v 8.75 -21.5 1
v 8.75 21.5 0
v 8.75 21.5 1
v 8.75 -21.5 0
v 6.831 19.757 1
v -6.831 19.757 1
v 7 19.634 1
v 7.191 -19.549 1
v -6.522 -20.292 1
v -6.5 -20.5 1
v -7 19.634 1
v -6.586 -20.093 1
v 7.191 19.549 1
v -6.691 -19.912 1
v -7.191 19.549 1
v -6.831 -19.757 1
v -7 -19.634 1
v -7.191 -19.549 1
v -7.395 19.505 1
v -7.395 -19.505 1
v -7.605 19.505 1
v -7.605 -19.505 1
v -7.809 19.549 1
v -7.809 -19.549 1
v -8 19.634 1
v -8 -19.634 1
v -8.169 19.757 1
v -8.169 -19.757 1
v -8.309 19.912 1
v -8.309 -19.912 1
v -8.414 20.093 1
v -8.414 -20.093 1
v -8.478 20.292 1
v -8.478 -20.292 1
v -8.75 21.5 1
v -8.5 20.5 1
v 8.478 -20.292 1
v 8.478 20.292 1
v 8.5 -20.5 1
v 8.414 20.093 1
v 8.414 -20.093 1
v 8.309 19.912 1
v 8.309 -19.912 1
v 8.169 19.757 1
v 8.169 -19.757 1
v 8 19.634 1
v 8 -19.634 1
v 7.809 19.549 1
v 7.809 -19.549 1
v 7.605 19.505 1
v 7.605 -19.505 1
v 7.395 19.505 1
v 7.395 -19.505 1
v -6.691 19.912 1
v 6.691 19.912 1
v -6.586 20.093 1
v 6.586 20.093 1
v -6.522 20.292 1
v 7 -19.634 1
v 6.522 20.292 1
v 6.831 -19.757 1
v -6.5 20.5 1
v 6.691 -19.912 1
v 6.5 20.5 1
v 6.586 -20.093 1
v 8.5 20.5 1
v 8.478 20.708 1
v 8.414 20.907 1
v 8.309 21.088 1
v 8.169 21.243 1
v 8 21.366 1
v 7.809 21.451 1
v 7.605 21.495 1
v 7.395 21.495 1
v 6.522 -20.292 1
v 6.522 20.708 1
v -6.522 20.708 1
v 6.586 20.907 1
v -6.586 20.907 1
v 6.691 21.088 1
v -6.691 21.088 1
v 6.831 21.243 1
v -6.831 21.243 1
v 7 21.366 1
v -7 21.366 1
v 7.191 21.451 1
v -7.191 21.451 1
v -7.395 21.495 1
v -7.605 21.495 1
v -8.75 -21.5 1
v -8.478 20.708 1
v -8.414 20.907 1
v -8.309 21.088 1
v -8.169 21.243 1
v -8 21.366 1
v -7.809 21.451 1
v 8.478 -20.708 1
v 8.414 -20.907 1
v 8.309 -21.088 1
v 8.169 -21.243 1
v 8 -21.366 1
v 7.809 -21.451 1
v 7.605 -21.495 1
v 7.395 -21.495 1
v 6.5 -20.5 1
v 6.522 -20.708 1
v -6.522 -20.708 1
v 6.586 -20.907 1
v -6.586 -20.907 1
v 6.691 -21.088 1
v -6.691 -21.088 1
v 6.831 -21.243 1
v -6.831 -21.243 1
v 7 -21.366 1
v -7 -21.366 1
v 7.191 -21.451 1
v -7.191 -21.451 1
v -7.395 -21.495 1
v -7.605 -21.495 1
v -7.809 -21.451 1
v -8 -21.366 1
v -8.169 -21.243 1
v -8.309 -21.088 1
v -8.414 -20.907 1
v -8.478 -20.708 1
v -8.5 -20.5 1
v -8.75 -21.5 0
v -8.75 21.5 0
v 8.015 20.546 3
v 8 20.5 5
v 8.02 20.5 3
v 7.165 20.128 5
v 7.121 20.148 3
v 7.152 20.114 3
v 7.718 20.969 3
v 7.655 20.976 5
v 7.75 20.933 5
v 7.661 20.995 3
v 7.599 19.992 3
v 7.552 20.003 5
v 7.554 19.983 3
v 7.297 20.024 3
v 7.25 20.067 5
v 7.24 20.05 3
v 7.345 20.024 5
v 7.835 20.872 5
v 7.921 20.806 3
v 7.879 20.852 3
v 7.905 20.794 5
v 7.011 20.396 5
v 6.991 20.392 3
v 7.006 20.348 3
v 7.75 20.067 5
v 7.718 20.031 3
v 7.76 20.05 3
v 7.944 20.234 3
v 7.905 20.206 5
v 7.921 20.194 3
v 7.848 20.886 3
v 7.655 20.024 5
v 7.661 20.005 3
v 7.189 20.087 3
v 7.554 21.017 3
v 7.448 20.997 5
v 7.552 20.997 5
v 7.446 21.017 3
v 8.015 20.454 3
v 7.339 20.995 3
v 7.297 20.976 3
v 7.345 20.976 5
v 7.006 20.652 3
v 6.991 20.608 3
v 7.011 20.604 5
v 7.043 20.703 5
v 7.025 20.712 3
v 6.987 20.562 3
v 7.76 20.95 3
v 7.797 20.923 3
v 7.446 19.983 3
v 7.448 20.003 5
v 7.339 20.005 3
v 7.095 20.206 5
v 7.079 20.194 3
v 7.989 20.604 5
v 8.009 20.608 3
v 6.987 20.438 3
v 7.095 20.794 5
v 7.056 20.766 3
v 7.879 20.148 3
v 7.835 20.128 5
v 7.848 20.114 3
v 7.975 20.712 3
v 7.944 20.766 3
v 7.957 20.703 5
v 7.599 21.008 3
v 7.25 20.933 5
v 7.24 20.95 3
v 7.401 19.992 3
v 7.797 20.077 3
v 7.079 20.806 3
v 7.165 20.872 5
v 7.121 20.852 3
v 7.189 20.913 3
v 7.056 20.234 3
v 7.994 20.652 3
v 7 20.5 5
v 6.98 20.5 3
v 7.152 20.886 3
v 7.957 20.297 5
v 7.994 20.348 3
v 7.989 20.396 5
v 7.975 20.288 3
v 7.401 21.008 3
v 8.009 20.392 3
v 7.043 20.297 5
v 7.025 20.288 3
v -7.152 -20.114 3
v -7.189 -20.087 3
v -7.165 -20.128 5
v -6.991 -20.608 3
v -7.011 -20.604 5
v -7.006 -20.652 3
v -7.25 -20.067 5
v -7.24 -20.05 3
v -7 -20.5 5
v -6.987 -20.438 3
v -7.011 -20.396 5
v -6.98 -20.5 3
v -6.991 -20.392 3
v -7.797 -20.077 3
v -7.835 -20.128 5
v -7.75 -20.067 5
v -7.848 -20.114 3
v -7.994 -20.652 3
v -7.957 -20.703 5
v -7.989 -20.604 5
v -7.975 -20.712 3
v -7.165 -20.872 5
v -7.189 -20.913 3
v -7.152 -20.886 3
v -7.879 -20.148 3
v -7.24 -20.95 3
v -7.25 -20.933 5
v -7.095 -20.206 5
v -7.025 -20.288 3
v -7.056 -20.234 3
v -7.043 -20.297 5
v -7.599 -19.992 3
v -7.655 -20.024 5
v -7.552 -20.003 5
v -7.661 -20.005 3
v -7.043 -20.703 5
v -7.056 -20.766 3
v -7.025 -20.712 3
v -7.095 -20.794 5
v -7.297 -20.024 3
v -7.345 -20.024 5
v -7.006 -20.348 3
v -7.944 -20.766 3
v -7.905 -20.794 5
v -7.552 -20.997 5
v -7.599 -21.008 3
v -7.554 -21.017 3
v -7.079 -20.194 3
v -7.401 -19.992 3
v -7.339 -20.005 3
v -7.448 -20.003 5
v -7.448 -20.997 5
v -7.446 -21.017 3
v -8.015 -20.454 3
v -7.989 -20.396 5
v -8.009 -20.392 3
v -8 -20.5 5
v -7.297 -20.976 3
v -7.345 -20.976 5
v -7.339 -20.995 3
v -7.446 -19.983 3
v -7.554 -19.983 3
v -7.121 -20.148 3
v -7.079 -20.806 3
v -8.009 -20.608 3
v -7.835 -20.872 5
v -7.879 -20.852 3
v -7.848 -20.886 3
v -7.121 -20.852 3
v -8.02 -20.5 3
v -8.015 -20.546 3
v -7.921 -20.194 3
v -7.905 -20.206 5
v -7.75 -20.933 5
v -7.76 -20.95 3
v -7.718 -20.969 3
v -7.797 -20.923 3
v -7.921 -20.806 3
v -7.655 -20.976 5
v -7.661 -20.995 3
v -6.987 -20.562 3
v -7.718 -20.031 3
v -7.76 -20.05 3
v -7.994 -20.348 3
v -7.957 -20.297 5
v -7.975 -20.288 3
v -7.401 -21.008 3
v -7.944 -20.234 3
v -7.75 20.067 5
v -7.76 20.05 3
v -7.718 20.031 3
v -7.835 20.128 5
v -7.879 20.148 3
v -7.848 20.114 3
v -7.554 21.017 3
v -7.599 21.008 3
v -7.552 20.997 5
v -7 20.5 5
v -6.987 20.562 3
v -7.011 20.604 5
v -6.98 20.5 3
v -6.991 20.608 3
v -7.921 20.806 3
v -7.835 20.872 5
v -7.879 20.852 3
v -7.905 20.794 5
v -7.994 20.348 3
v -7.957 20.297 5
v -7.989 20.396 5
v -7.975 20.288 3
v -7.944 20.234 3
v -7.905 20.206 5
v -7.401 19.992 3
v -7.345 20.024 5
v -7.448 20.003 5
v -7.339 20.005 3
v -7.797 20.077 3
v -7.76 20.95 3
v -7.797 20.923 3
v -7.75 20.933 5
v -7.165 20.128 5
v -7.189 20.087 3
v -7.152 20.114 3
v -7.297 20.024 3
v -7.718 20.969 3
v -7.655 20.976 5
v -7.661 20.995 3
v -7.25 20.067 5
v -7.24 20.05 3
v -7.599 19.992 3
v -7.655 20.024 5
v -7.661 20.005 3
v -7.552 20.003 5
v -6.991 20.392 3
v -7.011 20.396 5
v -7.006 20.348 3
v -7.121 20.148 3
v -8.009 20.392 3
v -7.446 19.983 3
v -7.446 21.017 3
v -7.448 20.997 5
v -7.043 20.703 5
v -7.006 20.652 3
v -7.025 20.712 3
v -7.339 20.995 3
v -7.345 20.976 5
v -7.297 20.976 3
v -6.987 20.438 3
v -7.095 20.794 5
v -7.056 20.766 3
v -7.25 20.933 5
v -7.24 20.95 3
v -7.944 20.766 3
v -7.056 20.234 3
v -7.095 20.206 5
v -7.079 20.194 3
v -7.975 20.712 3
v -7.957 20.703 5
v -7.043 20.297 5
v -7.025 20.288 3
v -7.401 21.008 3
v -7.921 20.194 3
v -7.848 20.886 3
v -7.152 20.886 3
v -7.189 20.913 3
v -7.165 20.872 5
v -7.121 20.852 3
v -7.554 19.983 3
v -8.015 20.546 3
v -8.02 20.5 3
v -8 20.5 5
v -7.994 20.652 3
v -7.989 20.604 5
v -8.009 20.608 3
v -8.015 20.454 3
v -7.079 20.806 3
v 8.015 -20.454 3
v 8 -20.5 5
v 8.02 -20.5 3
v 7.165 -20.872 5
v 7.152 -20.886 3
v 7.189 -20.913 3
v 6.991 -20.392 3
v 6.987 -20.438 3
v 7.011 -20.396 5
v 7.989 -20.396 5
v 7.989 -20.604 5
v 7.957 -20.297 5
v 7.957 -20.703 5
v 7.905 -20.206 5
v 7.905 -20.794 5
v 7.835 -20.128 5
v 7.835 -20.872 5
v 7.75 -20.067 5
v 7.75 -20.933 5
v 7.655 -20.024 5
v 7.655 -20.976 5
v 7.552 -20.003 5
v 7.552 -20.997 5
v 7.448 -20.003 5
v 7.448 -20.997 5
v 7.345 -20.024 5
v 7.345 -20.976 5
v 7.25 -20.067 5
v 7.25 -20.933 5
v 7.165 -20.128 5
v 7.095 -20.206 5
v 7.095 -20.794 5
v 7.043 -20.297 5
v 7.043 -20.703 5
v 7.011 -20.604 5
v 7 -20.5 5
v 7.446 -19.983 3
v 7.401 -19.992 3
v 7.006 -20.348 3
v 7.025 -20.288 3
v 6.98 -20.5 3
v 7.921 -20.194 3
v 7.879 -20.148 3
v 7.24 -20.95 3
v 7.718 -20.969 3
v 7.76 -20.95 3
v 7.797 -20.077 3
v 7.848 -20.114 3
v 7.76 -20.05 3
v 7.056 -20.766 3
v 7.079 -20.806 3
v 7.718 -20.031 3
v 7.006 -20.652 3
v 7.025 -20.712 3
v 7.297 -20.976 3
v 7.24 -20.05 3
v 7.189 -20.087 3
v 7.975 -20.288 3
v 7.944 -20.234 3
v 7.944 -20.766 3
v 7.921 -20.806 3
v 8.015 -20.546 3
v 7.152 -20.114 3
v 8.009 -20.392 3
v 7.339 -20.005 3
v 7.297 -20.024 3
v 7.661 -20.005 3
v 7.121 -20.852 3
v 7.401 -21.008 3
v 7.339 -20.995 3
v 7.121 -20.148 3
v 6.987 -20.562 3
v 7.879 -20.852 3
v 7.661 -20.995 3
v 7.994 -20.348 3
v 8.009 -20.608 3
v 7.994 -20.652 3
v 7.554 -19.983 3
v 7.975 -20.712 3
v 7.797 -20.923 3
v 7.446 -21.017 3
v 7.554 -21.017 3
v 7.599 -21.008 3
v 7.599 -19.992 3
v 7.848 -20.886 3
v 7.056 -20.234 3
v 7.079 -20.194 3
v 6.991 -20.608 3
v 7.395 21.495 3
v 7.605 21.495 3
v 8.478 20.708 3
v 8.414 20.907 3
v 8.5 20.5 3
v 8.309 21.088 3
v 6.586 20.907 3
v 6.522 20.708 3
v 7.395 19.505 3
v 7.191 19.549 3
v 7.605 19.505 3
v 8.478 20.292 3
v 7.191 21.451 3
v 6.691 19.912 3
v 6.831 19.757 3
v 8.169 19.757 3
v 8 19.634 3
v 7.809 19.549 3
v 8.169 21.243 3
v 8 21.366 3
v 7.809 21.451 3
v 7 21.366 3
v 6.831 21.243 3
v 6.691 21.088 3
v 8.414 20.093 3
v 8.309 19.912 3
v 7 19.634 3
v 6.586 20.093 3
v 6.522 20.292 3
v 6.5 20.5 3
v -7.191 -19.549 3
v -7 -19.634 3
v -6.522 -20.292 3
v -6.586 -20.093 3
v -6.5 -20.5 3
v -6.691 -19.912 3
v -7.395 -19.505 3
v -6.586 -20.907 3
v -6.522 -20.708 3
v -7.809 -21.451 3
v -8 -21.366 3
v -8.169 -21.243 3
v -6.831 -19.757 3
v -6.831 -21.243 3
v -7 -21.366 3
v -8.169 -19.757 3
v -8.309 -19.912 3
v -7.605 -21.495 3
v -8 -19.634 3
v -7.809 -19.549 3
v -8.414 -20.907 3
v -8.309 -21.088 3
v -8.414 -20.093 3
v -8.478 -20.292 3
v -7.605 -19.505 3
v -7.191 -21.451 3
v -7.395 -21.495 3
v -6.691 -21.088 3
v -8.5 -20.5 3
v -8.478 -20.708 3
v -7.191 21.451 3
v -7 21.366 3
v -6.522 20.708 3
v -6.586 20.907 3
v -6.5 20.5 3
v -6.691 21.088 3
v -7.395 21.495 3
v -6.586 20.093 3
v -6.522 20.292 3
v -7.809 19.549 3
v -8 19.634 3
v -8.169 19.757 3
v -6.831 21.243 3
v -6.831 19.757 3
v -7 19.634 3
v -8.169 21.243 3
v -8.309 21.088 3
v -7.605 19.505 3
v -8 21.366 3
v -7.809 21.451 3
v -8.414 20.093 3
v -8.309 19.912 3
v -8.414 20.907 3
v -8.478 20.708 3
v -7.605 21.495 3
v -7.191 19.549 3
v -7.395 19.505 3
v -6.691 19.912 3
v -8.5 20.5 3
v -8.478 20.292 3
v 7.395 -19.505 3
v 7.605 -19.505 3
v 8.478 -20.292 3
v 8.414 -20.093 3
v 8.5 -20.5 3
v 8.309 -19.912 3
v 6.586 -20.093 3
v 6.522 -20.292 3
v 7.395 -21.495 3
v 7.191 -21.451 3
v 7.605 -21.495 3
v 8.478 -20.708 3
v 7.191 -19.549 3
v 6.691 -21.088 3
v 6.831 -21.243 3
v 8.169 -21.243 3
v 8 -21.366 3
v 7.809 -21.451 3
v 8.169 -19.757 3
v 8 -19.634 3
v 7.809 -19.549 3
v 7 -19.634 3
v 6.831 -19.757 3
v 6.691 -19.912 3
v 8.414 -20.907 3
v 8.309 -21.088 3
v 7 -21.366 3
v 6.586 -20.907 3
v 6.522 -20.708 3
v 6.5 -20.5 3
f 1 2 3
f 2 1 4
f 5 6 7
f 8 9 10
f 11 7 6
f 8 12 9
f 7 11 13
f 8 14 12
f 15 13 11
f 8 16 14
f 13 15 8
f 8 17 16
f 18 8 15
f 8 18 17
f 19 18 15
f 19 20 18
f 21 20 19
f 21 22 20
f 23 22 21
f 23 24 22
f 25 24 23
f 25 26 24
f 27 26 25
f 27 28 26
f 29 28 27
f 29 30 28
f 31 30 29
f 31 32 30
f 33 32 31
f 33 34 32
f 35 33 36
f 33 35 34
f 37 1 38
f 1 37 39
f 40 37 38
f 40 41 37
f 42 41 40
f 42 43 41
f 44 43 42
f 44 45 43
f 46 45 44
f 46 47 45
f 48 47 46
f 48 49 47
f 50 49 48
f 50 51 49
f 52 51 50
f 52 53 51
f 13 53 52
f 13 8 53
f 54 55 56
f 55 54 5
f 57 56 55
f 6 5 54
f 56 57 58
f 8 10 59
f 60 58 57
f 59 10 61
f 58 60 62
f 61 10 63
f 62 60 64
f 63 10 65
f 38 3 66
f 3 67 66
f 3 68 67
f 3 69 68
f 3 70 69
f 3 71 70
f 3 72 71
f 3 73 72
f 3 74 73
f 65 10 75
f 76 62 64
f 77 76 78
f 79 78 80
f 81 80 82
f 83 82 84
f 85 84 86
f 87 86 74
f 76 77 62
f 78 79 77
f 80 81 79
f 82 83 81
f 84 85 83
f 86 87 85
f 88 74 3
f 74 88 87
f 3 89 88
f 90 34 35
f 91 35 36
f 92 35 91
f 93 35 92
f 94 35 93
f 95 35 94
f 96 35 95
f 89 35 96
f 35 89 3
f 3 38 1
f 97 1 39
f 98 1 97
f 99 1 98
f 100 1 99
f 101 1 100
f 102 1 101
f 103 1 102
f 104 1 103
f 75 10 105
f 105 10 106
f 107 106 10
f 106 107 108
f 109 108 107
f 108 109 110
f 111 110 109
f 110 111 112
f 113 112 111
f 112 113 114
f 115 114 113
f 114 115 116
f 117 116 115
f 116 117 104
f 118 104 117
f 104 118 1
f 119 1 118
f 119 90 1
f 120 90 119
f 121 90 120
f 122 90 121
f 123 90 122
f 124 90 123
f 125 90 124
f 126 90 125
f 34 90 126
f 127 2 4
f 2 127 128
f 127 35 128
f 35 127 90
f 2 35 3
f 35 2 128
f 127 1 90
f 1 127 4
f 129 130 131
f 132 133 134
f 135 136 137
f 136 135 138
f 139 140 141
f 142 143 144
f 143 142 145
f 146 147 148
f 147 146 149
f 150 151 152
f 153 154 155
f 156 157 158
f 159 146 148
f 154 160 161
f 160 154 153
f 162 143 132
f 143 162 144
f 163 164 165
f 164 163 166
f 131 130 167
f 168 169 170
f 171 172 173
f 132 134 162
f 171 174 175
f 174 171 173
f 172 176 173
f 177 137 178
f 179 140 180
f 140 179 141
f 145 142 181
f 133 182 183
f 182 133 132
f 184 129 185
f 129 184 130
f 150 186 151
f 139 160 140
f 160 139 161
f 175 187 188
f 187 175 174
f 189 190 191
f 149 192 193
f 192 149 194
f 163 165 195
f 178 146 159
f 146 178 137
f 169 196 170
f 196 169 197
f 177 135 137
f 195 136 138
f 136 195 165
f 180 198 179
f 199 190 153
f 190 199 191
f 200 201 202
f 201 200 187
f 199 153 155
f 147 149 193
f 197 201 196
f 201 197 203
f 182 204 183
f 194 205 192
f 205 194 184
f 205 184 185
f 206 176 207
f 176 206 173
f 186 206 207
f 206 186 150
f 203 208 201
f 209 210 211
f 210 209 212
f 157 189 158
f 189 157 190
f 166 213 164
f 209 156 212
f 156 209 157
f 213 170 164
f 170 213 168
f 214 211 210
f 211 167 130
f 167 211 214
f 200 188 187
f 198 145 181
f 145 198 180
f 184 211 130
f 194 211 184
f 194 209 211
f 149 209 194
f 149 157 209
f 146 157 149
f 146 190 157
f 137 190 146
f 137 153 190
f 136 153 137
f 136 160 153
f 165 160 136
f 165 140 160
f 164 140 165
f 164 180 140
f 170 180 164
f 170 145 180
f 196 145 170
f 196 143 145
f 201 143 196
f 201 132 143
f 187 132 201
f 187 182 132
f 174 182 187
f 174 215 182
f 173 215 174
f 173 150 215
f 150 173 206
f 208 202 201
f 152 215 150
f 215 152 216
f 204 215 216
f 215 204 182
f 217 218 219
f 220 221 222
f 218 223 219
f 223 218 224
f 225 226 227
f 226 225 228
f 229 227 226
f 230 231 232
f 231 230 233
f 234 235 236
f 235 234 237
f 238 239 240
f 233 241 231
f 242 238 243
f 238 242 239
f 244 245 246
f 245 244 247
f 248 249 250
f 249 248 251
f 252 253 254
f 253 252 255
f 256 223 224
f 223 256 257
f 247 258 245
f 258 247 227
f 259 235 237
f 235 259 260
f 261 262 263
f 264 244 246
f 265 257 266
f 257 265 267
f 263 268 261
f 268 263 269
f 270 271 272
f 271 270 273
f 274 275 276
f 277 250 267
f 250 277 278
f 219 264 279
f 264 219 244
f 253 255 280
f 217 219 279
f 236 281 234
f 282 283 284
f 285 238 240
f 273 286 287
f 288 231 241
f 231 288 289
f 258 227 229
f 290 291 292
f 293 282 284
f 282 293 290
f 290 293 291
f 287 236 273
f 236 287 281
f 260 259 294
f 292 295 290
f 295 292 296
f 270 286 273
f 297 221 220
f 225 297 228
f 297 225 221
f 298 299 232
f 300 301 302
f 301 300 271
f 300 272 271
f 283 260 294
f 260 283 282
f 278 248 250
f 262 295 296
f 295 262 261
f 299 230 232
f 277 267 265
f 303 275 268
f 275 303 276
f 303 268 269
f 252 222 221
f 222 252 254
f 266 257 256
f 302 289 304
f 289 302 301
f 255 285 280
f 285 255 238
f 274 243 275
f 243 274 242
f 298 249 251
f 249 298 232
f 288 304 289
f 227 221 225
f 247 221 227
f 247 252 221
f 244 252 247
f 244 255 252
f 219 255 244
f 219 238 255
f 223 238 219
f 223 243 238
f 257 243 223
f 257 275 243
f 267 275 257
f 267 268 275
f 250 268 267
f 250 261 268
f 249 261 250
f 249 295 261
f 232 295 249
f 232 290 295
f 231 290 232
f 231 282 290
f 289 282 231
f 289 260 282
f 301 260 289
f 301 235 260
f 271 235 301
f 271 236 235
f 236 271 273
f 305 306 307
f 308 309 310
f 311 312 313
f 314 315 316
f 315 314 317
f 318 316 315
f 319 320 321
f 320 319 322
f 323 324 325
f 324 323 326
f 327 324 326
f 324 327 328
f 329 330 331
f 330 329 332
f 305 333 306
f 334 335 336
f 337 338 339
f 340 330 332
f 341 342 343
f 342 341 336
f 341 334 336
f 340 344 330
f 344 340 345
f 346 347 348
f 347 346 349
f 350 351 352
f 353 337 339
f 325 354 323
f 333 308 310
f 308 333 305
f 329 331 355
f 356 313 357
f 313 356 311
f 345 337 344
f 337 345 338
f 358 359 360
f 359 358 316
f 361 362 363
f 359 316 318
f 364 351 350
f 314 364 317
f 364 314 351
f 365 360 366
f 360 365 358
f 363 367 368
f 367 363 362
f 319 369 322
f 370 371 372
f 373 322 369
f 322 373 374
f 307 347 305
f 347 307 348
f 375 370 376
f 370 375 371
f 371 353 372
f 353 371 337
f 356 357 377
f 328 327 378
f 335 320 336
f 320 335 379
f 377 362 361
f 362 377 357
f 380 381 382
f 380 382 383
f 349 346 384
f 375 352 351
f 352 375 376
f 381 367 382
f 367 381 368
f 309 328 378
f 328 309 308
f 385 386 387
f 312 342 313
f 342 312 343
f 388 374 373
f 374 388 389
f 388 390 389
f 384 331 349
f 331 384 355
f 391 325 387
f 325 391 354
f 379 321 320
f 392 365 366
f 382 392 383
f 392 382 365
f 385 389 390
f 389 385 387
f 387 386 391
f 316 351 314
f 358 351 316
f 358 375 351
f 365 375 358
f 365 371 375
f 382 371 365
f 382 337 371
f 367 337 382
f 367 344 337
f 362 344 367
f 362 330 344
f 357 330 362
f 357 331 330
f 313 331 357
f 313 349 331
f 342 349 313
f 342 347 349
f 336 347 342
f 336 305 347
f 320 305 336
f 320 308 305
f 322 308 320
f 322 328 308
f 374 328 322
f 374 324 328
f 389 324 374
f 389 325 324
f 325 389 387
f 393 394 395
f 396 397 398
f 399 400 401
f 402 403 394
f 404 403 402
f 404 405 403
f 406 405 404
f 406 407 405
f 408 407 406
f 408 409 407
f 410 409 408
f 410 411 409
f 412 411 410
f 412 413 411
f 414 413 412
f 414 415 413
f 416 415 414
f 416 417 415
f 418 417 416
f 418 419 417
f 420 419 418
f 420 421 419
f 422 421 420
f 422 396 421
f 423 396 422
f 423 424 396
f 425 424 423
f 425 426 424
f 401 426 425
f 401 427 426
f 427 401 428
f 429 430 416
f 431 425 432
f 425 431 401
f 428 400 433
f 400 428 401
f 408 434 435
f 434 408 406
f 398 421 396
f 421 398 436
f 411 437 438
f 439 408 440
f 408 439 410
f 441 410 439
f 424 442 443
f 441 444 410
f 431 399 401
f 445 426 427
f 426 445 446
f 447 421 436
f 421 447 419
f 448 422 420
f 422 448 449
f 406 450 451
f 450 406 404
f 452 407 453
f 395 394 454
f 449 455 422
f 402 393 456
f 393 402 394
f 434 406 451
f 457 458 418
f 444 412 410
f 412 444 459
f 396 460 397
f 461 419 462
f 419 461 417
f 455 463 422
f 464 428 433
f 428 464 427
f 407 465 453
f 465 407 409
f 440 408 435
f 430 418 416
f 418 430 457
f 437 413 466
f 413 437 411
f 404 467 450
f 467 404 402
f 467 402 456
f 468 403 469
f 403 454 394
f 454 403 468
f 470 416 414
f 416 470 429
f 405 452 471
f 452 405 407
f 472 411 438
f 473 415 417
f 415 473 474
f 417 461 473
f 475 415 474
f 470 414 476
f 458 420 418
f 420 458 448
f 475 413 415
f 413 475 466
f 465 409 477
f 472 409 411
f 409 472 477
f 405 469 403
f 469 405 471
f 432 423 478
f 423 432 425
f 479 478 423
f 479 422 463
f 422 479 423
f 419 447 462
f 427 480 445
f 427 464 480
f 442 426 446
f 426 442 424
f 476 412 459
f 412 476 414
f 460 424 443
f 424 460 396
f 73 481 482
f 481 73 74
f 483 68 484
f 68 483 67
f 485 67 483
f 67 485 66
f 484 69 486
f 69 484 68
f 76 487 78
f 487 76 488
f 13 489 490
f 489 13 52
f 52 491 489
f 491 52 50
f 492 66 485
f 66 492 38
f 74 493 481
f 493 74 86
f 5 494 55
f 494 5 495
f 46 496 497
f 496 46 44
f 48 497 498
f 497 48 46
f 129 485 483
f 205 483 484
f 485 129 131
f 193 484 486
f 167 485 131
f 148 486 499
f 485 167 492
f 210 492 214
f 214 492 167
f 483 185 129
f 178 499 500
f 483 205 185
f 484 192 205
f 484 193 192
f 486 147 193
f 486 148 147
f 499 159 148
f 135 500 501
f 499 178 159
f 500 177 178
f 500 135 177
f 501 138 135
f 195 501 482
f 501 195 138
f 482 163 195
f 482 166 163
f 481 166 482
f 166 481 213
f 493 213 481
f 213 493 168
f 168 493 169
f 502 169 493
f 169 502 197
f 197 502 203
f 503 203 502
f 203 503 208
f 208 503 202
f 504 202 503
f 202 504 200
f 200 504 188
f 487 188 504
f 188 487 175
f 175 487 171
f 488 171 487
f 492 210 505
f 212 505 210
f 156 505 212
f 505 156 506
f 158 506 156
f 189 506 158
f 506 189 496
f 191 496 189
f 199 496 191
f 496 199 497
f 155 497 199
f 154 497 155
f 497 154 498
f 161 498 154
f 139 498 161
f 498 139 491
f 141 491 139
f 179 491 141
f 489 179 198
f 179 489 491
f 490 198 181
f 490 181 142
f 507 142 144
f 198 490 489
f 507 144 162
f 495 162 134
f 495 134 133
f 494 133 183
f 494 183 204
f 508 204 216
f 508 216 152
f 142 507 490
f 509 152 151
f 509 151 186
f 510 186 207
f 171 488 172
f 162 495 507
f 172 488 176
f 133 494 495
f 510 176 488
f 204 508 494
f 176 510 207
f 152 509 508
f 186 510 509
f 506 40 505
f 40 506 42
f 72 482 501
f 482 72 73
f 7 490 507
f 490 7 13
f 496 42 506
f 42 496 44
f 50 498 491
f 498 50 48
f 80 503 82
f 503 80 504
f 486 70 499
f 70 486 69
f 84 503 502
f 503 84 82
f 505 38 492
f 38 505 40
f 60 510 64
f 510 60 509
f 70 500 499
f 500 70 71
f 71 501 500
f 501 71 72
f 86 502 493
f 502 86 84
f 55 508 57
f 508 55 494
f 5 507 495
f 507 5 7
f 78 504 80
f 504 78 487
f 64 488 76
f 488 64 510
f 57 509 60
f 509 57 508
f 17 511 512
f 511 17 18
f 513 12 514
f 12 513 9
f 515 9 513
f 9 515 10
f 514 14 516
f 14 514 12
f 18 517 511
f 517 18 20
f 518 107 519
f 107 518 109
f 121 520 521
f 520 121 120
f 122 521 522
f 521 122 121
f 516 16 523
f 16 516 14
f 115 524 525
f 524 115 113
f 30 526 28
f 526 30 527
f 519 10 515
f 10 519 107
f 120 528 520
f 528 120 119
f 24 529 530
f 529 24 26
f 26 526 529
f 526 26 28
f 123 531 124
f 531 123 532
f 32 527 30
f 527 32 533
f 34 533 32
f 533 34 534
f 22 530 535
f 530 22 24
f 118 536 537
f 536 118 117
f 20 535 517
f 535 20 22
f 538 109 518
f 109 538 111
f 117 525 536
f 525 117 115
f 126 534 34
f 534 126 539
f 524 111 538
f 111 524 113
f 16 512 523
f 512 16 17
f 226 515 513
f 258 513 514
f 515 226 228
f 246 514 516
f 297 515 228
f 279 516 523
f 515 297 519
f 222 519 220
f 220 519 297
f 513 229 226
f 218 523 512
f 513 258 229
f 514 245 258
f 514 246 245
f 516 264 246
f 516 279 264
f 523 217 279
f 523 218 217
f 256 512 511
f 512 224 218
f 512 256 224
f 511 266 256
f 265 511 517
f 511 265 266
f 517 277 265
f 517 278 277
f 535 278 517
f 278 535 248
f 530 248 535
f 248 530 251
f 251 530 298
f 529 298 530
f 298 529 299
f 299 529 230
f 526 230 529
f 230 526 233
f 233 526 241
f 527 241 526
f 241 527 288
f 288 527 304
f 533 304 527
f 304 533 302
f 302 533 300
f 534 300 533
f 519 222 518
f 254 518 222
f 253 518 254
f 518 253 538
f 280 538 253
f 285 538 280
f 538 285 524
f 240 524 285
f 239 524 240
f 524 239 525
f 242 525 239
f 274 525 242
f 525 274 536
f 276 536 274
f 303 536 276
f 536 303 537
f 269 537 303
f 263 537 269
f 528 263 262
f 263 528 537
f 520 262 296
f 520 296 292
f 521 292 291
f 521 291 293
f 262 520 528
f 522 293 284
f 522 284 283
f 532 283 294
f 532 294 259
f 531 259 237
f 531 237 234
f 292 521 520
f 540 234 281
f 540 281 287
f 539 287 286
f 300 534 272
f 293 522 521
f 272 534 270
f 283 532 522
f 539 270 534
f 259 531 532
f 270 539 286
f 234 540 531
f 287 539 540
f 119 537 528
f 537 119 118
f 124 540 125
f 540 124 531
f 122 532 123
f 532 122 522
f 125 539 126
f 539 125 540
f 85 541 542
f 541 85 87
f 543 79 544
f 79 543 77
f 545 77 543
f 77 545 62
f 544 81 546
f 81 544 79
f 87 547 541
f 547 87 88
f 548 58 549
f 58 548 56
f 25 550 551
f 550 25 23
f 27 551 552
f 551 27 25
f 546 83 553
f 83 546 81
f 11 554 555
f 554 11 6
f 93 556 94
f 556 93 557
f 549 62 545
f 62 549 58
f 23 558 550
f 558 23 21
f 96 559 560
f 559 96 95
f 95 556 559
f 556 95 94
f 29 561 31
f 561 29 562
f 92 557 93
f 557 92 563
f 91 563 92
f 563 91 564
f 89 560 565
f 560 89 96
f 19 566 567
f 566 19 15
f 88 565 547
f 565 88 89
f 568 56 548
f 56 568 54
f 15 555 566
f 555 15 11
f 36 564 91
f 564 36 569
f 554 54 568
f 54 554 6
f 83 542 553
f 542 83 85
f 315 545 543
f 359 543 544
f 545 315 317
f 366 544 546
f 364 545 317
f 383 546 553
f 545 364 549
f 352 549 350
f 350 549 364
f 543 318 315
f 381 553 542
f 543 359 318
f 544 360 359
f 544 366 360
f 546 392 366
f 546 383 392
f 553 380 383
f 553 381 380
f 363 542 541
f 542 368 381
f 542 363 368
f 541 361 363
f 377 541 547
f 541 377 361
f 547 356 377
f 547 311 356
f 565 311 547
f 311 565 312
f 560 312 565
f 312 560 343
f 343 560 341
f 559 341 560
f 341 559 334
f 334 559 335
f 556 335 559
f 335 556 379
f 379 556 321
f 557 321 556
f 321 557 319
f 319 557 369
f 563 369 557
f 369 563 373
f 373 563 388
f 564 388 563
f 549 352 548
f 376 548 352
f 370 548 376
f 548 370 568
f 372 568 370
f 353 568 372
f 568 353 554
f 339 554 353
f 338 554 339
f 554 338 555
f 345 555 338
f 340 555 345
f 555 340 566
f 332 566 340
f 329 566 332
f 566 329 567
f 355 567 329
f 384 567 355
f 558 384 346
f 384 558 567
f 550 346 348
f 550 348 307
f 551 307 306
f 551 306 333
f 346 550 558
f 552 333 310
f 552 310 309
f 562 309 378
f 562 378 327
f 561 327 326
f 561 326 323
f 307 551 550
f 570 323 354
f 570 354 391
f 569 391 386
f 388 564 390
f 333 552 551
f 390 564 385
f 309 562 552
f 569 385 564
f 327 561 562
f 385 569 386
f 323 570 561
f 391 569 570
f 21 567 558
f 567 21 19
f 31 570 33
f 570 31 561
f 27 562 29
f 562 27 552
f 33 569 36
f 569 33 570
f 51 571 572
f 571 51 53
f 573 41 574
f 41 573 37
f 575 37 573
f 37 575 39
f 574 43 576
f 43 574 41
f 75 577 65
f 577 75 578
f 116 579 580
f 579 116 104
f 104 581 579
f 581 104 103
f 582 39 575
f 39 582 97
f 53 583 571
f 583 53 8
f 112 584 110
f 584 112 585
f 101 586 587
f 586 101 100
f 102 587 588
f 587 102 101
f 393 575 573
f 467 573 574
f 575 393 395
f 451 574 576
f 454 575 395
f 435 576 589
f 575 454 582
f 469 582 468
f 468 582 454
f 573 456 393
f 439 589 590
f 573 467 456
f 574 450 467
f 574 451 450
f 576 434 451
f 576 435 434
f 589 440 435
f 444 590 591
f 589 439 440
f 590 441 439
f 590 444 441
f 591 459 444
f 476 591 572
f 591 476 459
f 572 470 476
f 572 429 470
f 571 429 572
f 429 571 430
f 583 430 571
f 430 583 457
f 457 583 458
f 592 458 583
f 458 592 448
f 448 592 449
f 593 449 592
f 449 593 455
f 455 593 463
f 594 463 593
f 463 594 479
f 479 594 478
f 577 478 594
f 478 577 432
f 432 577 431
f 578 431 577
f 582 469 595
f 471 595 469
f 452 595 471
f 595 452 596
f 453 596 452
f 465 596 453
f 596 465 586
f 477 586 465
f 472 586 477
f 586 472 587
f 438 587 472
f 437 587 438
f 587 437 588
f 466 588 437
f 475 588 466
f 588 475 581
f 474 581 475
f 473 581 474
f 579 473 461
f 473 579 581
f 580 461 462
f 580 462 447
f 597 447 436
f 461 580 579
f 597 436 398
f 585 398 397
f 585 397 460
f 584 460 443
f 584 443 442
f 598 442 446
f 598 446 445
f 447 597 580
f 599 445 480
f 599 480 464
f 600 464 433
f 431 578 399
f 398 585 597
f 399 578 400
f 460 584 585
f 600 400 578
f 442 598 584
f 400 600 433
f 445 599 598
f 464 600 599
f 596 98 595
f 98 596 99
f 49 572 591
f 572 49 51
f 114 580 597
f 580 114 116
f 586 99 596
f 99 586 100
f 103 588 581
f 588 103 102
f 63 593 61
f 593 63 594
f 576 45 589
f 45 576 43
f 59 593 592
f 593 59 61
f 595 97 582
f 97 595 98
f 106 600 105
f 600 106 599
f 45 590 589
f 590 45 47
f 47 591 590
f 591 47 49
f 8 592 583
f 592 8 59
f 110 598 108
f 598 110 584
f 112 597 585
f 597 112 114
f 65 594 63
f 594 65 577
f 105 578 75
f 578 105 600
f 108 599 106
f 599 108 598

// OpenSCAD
translate([0,0,0.5]) cube([17.5,43,1], true);

a  = 7.5;
b  = 20.5;
translate([a,b,0])
    cylinder(5,0.55,0.5,false, $fn=30);

translate([-a,-b,0])
    cylinder(5,0.55,0.5,false, $fn=30);

translate([-a,b,0])
    cylinder(5,0.55,0.5,false, $fn=30);

translate([a,-b,0])
    cylinder(5,0.55,0.5,false, $fn=30);

translate([a,b,0])
    cylinder(3,1,1,false, $fn=30);

translate([-a,-b,0])
    cylinder(3,1,1,false, $fn=30);

translate([-a,b,0])
    cylinder(3,1,1,false, $fn=30);

translate([a,-b,0])
    cylinder(3,1,1,false, $fn=30);
